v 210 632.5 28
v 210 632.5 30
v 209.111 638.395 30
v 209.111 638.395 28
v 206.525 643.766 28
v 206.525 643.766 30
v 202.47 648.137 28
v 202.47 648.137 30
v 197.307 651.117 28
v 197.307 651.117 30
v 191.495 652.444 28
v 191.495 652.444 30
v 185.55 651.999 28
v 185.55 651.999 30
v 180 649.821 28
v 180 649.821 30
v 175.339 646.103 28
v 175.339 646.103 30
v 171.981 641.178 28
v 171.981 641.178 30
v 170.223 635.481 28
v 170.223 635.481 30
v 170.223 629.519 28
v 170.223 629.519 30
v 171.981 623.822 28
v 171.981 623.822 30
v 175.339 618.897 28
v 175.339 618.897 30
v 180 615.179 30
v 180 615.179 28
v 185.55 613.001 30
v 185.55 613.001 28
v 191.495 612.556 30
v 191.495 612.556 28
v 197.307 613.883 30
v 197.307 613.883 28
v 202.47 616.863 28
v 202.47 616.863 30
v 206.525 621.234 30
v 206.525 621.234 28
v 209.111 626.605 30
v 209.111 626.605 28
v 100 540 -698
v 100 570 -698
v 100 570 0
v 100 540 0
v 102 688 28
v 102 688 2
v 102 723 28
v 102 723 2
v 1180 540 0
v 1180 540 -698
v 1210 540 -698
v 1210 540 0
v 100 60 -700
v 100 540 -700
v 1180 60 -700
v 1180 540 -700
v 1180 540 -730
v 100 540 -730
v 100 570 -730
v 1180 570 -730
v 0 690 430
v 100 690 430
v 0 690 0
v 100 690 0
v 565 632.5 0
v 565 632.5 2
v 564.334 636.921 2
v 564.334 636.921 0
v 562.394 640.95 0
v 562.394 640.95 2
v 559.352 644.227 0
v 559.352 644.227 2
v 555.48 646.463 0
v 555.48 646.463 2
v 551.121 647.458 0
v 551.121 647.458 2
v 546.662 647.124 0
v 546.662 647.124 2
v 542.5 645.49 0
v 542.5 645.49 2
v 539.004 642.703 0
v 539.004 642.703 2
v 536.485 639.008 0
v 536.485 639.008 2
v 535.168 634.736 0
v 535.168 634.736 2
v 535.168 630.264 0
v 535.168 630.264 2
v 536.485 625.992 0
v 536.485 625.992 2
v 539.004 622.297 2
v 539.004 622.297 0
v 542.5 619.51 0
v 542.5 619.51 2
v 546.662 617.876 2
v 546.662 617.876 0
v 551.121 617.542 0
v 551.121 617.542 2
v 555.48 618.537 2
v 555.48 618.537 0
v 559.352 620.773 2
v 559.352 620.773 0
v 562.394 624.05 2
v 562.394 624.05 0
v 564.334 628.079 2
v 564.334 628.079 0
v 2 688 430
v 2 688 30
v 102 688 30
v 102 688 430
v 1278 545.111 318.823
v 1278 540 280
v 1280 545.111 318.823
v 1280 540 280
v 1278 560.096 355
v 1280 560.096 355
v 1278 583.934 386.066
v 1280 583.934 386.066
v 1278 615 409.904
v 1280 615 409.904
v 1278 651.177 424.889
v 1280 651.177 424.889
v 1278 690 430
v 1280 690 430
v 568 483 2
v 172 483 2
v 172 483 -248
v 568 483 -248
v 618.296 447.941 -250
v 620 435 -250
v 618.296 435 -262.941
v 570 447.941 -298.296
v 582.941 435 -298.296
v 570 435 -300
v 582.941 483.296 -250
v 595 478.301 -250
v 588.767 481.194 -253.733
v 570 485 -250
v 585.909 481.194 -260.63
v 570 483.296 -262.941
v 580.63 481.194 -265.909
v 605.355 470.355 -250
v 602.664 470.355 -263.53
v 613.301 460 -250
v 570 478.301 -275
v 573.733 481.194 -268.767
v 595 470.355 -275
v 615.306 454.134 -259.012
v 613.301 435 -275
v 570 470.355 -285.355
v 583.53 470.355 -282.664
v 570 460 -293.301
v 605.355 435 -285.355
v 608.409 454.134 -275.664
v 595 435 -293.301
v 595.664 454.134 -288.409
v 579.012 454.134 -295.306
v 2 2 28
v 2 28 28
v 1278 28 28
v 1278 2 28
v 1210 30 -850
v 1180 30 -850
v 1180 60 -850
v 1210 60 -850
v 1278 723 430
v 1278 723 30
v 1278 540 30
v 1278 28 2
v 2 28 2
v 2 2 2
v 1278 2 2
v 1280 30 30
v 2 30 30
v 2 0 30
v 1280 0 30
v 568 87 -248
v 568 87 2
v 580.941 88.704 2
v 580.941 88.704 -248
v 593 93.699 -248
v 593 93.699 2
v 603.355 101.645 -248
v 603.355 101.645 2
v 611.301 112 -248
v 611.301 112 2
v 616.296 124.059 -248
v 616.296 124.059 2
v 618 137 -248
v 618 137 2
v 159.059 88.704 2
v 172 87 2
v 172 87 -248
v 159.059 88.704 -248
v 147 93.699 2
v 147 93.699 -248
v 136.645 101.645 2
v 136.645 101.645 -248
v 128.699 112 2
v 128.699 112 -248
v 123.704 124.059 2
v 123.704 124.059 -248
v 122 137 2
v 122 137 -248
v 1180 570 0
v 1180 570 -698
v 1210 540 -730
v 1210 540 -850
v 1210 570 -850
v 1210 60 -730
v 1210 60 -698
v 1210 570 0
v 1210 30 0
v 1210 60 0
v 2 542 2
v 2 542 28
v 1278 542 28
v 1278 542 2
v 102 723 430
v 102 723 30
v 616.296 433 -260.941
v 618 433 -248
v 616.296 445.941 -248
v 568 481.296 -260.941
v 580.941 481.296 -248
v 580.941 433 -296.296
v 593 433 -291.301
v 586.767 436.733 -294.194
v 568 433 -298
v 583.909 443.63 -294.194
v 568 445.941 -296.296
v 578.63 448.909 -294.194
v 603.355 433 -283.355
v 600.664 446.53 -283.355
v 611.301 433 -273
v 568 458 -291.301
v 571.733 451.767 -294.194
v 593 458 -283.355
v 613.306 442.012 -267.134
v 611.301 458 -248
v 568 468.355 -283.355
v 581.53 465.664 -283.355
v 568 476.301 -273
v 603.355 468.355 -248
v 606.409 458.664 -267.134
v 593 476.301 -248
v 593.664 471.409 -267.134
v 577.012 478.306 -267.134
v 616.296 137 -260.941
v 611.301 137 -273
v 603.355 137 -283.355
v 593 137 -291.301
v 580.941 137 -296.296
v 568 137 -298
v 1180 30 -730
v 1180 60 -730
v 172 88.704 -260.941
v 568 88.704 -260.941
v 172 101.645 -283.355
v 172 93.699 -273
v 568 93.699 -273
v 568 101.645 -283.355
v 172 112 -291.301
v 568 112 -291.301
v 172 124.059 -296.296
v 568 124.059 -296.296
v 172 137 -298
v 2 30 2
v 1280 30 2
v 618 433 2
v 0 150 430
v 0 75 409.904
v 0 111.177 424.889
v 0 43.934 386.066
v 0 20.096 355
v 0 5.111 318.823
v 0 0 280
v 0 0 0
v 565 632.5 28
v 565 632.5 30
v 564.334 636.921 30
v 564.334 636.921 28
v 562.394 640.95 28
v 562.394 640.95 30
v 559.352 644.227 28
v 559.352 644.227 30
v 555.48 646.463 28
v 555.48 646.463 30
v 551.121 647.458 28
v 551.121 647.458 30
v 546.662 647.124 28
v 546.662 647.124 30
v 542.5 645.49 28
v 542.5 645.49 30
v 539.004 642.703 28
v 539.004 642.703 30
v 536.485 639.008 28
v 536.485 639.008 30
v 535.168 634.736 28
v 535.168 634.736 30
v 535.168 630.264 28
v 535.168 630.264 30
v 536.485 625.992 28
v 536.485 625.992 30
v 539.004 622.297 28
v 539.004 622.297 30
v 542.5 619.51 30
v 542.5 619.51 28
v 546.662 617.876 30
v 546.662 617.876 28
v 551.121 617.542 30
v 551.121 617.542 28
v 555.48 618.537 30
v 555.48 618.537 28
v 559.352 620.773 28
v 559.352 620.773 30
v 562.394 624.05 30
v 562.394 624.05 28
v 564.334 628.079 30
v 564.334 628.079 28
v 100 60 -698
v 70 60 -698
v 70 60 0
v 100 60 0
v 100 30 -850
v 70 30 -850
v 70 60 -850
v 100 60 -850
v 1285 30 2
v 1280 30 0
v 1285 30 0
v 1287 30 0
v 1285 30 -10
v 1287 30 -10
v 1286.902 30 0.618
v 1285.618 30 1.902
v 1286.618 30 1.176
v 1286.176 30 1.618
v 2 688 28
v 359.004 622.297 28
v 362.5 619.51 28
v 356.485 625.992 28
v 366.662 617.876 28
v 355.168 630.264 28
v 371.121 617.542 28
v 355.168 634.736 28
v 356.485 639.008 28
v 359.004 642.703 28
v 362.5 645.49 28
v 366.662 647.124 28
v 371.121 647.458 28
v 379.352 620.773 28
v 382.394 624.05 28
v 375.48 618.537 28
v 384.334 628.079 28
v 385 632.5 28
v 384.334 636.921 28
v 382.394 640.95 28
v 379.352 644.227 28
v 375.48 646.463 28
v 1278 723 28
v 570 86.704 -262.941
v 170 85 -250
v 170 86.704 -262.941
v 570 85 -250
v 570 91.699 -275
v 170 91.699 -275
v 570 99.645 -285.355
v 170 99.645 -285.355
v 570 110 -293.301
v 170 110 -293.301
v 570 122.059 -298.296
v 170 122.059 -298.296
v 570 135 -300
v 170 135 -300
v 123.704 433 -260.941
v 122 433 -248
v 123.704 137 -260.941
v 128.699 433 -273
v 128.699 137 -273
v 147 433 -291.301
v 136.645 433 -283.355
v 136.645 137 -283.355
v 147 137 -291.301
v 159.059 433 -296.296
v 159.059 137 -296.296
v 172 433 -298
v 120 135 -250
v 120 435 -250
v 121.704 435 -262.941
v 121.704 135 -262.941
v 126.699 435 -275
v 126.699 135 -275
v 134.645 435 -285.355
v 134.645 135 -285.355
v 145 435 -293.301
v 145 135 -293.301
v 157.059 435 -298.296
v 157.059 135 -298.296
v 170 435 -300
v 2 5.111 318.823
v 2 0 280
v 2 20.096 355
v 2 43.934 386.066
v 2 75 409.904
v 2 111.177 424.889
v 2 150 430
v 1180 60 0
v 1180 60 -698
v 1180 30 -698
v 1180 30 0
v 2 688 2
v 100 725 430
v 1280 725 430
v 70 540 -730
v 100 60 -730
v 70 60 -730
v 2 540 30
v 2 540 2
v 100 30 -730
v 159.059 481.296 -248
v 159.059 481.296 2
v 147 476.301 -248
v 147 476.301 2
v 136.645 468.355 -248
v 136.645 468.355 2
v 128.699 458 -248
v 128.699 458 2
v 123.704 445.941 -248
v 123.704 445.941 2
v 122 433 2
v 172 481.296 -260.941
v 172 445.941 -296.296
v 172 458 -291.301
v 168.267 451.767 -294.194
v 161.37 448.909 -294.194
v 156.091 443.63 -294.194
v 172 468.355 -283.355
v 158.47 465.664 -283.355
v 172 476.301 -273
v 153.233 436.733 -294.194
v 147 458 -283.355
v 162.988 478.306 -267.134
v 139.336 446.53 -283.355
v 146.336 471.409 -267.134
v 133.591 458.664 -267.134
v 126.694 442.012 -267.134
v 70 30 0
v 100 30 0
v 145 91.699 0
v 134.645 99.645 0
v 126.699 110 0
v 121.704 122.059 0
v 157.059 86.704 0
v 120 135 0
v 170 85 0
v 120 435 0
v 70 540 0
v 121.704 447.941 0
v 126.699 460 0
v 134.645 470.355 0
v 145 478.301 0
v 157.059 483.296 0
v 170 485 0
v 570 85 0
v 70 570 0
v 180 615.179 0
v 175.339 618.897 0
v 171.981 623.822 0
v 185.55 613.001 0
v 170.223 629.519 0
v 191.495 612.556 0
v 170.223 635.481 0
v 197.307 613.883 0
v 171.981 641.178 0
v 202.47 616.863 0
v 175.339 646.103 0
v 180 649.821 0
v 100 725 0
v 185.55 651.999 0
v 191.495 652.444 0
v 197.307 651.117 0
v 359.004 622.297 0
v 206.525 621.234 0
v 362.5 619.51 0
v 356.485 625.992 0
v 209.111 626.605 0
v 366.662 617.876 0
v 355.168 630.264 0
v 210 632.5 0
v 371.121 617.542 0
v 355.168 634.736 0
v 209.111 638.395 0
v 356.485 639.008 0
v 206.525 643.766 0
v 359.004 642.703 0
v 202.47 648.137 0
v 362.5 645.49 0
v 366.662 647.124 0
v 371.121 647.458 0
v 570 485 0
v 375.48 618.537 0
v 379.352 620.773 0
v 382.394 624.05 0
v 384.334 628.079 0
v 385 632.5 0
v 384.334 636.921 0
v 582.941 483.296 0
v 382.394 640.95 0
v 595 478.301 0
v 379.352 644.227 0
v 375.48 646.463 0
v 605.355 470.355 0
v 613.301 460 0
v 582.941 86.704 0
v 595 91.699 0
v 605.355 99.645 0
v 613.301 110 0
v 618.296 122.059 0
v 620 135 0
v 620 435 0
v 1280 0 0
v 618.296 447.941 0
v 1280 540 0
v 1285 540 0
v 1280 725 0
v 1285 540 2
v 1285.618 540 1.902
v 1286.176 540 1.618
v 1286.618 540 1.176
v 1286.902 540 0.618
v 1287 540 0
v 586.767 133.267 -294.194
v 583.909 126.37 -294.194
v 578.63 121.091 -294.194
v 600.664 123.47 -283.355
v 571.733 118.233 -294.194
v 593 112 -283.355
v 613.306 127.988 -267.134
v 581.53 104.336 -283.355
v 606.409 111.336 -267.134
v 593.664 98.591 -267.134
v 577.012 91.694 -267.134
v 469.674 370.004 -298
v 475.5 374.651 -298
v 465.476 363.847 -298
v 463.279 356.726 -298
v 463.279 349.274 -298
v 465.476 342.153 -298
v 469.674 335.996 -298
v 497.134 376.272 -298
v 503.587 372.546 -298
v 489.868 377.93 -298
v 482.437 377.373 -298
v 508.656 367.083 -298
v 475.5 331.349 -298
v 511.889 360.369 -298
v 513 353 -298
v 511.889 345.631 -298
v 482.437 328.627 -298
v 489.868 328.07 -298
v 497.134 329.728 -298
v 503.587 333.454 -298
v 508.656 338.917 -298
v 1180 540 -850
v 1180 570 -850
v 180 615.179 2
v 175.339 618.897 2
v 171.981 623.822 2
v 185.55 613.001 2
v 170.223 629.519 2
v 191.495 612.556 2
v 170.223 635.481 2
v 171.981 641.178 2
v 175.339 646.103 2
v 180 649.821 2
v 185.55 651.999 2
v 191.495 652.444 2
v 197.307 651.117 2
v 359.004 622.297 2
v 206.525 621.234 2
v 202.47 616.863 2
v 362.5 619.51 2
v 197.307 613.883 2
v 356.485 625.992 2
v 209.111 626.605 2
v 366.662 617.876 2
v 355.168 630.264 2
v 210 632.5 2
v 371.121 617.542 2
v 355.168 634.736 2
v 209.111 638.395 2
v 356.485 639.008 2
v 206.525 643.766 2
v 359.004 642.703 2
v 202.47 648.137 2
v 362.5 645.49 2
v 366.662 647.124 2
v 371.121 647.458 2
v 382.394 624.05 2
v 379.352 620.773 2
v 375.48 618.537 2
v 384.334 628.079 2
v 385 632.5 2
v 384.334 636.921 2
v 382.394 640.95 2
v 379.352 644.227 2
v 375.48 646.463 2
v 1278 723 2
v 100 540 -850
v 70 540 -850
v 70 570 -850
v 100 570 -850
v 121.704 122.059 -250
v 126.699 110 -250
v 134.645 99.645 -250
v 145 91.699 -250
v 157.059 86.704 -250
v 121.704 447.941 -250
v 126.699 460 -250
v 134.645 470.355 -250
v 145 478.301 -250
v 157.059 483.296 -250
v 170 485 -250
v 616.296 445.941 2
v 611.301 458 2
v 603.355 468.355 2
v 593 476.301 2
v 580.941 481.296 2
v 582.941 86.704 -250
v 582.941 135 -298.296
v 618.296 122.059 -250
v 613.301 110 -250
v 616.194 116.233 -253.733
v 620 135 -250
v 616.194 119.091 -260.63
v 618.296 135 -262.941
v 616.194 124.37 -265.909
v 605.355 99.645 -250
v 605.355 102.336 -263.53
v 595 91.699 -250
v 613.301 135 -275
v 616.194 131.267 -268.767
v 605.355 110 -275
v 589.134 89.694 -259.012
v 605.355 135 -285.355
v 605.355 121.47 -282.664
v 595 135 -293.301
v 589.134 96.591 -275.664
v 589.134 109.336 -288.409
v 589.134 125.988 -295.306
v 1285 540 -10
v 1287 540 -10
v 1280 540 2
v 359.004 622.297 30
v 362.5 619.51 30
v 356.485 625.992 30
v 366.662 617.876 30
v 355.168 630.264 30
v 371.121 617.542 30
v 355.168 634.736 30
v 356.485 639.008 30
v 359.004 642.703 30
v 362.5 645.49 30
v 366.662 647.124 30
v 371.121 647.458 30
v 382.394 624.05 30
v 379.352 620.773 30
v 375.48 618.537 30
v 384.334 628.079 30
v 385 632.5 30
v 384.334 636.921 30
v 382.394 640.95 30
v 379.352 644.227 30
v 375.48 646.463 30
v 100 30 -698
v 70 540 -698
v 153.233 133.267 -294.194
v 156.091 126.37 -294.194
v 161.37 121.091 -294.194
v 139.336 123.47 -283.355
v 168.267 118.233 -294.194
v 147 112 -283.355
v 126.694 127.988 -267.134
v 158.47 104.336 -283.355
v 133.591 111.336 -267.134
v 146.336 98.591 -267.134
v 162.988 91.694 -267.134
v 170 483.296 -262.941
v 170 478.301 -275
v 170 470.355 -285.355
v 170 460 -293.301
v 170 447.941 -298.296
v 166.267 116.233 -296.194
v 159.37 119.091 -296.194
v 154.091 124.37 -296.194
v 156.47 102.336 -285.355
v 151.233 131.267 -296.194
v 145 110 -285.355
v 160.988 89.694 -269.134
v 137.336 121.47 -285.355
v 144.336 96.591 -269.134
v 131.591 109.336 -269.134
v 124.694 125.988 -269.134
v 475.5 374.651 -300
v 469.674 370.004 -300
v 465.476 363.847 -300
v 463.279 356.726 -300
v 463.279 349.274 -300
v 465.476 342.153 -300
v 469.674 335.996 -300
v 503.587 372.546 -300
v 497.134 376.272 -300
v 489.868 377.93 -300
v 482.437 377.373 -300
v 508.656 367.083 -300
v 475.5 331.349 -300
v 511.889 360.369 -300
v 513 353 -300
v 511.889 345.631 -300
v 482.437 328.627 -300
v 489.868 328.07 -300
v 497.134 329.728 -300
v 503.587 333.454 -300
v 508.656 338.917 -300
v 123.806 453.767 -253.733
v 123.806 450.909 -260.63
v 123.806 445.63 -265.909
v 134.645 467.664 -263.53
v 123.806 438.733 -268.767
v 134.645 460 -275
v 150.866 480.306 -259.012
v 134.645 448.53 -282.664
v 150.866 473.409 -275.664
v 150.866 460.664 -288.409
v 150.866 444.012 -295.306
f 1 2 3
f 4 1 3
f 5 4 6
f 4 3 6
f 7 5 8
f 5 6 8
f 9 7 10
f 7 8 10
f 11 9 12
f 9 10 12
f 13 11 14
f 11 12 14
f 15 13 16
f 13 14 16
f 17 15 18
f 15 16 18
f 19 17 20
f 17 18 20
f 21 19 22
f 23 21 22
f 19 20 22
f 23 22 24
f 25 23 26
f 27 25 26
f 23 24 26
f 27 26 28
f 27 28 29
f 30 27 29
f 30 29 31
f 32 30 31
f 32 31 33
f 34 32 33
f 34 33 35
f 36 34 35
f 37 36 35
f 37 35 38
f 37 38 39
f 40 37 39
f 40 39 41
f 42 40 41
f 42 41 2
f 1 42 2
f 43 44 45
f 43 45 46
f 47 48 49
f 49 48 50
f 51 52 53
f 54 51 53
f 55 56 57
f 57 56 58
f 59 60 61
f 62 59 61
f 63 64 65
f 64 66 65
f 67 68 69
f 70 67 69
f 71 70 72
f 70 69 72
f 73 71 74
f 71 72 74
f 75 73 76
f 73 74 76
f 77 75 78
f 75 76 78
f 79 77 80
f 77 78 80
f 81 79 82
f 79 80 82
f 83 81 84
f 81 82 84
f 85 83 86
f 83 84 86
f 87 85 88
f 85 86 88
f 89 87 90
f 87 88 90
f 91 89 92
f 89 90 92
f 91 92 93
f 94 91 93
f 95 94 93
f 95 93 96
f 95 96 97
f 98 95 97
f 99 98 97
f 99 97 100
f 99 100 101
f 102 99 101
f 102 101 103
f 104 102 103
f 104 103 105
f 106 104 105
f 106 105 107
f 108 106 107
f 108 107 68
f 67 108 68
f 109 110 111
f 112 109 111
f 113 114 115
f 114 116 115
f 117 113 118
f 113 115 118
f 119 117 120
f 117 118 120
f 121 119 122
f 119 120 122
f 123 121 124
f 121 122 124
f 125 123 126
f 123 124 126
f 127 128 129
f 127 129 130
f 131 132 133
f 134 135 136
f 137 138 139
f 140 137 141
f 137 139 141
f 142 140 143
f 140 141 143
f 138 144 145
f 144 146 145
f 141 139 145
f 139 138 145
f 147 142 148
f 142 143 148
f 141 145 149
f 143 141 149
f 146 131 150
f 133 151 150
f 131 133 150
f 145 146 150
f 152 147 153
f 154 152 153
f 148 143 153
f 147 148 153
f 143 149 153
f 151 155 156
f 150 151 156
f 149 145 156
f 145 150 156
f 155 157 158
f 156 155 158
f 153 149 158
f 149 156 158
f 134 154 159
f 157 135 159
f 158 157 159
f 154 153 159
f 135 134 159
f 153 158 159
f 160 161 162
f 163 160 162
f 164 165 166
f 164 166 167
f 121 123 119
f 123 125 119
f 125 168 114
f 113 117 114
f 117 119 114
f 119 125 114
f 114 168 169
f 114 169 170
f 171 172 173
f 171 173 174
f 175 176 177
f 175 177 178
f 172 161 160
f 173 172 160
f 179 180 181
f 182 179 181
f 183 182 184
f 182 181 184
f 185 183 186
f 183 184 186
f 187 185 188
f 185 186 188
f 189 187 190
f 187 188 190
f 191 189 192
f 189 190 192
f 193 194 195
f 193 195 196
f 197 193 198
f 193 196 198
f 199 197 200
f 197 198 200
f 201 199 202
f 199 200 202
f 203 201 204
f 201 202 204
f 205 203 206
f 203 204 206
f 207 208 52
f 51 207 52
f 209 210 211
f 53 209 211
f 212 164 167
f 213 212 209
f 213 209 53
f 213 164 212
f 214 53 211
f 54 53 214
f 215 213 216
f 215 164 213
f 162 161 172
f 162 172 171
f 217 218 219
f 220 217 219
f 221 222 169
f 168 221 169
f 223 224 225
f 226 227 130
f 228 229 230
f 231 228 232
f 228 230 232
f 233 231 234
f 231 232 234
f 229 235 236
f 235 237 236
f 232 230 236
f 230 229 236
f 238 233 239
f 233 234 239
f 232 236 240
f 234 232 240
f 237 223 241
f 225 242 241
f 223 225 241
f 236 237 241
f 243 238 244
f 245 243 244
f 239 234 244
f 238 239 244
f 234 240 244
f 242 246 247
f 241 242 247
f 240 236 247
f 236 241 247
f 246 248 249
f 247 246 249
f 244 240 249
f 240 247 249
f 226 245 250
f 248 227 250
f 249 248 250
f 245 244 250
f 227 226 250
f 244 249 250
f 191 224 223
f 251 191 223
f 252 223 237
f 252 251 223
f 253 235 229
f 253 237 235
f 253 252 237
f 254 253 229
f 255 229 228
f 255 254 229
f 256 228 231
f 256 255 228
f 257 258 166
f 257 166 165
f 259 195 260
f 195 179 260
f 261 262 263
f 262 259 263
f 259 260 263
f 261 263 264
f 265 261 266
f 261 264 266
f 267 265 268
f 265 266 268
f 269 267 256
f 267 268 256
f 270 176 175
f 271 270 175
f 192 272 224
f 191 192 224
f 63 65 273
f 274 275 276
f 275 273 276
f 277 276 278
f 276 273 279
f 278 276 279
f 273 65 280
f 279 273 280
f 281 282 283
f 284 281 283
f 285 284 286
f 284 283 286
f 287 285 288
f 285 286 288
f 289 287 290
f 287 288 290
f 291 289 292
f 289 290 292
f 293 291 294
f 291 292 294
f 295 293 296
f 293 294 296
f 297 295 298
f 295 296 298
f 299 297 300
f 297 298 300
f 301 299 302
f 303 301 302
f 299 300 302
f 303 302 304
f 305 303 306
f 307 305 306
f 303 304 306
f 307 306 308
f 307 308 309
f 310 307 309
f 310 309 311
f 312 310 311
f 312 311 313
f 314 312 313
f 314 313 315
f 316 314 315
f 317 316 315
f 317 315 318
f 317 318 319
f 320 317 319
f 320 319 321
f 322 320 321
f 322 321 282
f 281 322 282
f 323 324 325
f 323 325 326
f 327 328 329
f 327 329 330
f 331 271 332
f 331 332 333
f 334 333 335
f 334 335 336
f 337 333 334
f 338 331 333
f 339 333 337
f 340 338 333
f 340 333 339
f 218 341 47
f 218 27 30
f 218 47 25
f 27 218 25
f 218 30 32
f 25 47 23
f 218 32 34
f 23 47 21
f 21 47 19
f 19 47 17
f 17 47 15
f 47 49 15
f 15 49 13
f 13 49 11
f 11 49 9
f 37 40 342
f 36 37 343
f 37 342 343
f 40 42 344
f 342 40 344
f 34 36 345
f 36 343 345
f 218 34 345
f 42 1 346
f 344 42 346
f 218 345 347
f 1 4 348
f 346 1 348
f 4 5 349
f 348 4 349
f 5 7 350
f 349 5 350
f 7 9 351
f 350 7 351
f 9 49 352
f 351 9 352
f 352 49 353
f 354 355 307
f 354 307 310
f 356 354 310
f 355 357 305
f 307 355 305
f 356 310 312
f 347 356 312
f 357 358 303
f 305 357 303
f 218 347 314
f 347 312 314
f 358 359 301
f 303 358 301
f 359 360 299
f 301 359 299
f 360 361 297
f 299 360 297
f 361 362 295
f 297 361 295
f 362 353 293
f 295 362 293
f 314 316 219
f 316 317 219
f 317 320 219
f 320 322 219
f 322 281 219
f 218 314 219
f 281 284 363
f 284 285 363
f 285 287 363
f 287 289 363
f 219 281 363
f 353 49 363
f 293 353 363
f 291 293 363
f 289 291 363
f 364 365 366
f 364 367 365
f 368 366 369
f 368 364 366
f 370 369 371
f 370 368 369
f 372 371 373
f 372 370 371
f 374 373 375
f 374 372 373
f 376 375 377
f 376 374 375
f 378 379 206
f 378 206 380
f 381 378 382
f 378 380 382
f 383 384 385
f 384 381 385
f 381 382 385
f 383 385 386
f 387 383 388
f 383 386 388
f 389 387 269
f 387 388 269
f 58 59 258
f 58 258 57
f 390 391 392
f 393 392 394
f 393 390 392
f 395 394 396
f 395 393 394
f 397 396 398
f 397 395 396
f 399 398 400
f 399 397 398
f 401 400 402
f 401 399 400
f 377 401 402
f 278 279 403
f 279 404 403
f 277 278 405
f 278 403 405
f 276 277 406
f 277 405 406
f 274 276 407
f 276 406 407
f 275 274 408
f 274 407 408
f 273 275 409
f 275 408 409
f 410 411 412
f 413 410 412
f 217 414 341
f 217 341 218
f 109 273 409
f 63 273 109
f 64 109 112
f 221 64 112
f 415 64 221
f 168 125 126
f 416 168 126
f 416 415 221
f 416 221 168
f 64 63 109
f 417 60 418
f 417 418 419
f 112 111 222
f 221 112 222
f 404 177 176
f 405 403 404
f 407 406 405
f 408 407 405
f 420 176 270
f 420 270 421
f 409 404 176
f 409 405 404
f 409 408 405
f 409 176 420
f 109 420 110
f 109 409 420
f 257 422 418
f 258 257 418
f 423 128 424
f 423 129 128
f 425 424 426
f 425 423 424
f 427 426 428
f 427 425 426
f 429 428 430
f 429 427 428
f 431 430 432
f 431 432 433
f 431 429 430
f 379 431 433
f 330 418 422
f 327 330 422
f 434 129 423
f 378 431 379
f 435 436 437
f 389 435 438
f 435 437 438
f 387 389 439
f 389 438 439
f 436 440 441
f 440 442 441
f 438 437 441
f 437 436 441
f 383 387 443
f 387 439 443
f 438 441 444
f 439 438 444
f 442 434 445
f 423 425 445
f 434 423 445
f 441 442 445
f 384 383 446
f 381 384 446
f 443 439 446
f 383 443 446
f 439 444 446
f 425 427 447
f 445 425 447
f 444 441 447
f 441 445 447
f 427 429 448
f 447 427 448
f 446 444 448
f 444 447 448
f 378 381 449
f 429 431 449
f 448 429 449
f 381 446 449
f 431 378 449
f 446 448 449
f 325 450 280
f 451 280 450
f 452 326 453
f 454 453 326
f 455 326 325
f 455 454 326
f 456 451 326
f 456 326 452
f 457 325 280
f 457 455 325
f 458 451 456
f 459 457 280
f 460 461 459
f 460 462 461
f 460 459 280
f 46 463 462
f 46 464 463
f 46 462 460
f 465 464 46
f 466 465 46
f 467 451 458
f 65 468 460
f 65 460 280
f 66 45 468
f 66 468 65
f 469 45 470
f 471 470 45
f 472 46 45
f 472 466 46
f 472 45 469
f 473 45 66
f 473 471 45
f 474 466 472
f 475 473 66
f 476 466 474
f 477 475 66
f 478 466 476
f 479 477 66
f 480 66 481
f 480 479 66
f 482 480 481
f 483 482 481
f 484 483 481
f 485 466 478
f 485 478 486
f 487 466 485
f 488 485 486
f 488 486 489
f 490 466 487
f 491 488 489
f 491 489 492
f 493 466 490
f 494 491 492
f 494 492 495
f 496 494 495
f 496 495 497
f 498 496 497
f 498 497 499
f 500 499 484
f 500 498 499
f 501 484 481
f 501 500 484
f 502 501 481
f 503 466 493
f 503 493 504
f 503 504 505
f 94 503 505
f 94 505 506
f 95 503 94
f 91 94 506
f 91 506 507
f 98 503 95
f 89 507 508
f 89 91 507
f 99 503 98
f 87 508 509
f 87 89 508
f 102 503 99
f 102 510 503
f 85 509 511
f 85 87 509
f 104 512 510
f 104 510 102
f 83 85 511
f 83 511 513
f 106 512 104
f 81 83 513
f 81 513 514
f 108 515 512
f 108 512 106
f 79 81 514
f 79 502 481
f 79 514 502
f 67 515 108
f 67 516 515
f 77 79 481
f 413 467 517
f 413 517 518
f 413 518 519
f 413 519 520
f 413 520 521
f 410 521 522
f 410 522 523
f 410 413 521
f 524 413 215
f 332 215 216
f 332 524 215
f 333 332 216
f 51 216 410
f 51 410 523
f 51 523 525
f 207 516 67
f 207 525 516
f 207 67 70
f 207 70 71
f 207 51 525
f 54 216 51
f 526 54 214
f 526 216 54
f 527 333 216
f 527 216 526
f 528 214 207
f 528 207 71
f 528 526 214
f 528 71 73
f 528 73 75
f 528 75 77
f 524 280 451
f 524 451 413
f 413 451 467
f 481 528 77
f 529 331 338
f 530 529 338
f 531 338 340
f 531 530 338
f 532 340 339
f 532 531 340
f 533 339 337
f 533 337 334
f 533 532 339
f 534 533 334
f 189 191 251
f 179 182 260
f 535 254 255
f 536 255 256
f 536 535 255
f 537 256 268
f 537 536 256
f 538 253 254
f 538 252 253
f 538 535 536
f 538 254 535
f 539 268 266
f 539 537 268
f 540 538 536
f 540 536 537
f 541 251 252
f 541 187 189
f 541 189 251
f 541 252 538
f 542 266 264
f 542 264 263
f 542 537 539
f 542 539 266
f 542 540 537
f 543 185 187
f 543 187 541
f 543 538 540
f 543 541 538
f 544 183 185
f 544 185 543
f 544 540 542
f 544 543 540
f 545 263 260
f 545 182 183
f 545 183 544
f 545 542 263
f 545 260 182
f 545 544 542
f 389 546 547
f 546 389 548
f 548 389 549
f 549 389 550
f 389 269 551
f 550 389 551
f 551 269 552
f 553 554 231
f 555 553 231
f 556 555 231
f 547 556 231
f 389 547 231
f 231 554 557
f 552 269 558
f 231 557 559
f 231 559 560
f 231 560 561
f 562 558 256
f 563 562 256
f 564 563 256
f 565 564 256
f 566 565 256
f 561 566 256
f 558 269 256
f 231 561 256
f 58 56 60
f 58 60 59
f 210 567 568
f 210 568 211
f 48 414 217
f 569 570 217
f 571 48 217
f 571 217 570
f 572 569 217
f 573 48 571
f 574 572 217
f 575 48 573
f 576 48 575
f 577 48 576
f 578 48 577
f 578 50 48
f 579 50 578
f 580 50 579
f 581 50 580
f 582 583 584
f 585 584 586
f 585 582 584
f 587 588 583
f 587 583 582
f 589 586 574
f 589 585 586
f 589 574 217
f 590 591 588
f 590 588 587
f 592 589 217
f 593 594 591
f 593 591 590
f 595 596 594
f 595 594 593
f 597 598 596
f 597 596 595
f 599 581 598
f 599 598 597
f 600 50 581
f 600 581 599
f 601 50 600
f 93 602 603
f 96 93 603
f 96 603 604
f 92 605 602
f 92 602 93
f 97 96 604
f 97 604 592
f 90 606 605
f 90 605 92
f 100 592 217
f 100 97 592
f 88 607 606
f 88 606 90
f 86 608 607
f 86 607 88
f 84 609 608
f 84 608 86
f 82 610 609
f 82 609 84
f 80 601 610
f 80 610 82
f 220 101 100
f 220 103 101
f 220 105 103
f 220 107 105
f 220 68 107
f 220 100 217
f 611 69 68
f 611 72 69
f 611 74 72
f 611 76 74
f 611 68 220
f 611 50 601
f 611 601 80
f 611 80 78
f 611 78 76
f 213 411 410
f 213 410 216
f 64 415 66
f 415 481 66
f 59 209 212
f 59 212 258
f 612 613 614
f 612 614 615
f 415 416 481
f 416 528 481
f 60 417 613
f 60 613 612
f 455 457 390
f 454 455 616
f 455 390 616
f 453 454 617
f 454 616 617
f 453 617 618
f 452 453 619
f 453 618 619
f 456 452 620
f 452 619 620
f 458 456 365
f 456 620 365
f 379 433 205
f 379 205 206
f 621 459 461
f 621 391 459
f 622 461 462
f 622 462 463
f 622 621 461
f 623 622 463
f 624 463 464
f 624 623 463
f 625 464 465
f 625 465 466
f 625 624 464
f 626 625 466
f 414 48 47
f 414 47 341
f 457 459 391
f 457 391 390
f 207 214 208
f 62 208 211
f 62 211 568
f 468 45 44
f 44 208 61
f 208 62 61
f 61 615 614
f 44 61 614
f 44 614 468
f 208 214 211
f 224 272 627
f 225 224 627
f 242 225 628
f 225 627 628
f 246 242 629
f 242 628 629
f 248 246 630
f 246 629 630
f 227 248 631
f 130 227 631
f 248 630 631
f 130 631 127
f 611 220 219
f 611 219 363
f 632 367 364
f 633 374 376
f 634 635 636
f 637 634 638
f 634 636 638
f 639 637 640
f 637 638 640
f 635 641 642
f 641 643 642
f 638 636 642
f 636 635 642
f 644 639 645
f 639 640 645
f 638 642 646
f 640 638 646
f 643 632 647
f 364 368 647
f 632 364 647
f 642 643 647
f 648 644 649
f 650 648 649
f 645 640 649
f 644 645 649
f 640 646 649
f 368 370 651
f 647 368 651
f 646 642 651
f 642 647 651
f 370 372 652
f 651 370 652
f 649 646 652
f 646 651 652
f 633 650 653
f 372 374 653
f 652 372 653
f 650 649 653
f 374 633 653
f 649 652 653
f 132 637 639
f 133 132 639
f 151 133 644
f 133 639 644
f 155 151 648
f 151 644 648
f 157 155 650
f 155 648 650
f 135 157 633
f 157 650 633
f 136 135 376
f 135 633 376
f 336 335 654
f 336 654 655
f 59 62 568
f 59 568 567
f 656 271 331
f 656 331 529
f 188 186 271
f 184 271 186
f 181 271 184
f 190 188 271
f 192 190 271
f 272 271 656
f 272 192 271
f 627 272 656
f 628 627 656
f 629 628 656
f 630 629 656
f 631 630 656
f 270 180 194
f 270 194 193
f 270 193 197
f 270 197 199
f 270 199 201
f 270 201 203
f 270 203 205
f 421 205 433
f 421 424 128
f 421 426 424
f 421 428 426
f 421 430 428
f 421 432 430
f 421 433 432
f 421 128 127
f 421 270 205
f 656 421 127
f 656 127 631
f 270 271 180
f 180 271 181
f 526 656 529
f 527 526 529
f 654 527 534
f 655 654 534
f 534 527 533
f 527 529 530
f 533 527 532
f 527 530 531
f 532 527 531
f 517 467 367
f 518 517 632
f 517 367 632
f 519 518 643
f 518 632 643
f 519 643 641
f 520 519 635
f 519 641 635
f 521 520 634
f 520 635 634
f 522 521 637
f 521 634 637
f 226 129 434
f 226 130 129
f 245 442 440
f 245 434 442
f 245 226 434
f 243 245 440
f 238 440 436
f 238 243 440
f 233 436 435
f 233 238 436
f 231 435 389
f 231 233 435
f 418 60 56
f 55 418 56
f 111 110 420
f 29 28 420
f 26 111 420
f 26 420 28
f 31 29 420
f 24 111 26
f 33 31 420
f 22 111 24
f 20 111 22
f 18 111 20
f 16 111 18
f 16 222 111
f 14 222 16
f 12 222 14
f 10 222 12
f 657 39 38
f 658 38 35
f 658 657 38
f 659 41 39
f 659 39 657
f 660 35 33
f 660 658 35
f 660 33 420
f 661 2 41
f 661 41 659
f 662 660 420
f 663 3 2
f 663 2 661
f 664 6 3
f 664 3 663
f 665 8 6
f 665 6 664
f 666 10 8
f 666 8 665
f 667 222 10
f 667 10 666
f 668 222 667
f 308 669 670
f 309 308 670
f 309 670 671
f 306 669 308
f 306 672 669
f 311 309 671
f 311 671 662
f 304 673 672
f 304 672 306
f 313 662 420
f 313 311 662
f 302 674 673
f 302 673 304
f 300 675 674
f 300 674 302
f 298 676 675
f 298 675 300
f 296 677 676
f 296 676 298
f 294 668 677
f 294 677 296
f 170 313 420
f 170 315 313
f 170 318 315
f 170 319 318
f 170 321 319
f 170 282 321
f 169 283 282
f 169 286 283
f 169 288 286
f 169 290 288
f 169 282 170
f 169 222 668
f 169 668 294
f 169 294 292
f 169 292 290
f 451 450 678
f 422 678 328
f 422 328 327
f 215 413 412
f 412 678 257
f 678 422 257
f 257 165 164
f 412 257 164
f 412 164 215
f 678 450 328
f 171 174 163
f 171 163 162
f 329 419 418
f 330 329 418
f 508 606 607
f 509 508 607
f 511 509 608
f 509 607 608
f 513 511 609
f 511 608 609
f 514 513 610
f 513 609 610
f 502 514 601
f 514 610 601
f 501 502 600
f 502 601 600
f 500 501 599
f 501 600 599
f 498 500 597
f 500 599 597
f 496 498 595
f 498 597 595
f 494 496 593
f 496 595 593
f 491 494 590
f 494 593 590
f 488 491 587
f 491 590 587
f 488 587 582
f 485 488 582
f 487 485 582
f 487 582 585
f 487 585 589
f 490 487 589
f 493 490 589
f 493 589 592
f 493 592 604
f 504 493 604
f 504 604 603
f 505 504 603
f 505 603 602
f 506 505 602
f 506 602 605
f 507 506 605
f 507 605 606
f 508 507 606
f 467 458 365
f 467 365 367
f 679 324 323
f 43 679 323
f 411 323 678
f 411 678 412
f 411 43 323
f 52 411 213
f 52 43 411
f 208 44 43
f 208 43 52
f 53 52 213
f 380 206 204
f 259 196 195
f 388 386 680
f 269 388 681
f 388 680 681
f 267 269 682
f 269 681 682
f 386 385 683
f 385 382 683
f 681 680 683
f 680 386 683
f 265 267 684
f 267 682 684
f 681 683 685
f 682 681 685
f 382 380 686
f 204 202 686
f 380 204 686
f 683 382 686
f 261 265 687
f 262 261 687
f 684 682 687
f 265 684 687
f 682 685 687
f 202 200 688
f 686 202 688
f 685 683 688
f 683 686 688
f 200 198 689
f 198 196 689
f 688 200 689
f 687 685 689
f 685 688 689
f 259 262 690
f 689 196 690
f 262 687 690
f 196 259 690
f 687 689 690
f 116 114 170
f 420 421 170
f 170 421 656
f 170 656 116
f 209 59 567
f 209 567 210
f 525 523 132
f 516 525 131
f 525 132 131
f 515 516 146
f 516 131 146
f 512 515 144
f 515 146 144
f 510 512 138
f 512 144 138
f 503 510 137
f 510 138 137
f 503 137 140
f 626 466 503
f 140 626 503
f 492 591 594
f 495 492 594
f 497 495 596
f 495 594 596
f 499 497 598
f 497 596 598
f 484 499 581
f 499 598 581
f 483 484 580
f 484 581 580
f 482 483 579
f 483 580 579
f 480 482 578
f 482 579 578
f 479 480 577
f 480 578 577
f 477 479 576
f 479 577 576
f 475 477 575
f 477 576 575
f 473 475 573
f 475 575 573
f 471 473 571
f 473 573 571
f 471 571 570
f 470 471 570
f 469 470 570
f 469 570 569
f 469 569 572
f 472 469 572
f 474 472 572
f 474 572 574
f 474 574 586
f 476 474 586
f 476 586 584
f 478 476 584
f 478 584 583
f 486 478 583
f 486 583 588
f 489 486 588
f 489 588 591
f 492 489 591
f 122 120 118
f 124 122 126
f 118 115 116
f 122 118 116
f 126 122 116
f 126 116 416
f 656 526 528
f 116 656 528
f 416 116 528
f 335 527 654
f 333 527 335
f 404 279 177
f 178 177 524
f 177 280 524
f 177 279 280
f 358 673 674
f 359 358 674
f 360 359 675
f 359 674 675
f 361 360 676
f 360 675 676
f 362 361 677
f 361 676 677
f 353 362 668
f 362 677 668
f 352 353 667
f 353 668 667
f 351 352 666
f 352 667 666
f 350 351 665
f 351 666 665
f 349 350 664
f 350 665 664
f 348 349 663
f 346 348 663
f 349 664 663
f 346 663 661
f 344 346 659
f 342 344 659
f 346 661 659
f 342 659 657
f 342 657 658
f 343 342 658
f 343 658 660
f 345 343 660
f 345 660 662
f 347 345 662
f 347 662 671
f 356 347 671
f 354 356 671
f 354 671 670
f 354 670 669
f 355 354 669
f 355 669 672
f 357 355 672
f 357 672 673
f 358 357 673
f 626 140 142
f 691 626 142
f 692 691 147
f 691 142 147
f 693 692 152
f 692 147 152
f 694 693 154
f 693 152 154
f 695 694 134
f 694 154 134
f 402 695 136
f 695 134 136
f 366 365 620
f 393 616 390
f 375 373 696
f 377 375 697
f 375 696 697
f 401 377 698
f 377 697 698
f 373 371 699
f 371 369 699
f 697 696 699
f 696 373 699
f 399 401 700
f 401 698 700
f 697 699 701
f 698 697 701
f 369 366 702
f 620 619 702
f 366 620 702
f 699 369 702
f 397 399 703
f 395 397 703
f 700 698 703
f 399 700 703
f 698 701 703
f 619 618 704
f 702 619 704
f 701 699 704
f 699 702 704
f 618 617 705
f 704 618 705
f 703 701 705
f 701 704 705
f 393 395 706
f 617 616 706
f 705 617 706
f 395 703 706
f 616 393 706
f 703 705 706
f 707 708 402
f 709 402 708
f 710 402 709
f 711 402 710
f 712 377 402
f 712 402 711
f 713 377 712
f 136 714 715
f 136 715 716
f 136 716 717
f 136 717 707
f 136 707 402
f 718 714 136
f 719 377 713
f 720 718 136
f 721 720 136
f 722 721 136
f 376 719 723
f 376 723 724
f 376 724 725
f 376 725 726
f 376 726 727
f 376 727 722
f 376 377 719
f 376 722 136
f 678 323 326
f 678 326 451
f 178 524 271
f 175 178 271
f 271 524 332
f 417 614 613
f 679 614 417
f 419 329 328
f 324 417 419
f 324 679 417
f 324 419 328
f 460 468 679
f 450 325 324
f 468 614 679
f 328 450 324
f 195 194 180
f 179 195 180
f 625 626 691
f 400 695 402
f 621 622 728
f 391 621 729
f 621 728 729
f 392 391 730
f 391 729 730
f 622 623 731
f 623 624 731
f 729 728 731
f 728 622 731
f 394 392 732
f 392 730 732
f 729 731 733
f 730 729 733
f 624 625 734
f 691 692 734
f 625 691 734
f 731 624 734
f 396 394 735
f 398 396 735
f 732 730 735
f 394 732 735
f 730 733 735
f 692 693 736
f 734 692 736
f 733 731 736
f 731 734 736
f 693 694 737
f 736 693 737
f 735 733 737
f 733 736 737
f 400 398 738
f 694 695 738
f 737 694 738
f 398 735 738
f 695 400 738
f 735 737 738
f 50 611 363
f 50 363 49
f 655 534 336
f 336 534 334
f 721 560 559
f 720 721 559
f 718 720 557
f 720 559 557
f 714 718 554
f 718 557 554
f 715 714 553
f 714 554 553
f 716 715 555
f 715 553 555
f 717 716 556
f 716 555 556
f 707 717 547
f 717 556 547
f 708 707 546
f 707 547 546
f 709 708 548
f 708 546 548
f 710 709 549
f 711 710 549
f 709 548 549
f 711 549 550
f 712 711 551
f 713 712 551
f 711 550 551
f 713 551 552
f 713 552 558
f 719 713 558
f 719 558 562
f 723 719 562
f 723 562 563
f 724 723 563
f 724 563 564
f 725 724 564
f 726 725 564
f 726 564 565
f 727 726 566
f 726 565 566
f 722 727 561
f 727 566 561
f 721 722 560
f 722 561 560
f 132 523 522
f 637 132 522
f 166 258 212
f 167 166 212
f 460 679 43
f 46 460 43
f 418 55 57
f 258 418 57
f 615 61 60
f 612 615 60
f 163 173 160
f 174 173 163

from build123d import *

# Parameters (mm, degrees)
F1_DEPTH    = 30
F2_W        = 1278
F2_H        = 510
F3_DEPTH    = 28
F4_W        = 500
F4_H        = 400
F5_DEPTH    = 300
F6_T        = 2
F6_T3_DEPTH = 34
F6_T5_DEPTH = 404
F6_T7_DEPTH = 504
F6_T9_DEPTH = 32
F7_R        = 50
F8_R        = 25
F9_DEPTH    = 2
F10_R       = 15
F10_R_2     = 20
F11_DEPTH   = 30
F12_W       = 510
F12_H       = 2
F13_DEPTH   = 5
F14_W       = 510
F14_H       = 2
F15_ANGLE   = 90
F16_W       = 2
F16_H       = 510
F17_DEPTH   = 10
F19_DEPTH   = 400
F20_R       = 150
F21_W       = 30
F21_H       = 30
F22_DEPTH   = 850
F23_W       = 30
F23_H       = 30
F24_DEPTH   = 1080
F25_W       = 30
F25_H       = 30
F26_DEPTH   = 480
F28_DEPTH   = 2


# Not quite as in the source:
# - a shell that OpenCascade refuses in one call is made with other operations: the cavity is built on its own and cut out


with BuildPart() as f1:
    # F0 (on Top) → F1 (new body)
    with BuildSketch(Plane.XY):
        Polygon((0, 690), (0, 0), (1280, 0), (1280, 725), (100, 725), (100, 690), align=None)
    extrude(amount=F1_DEPTH)

    # F2 (on face) → F3 (cut)
    with BuildSketch(Plane.XY.offset(30)):
        with Locations((641, 285)):
            Rectangle(F2_W, F2_H)
    extrude(amount=-F3_DEPTH, mode=Mode.SUBTRACT)

    # F4 (on face) → F5 (join)
    with BuildSketch(Plane(origin=(0, 0, 0), x_dir=(1, 0, 0), z_dir=(0, 0, -1))):
        with Locations((370, -285)):
            Rectangle(F4_W, F4_H)
    extrude(amount=F5_DEPTH)

    # F6: shell of thickness 2, made by hand


with BuildPart() as f6_core1:
    # F6_t2: copy of F1
    add(f1.part)

    # the walls: a layer under each face that stays
    f6_faces = [f6_core1.faces().sort_by_distance(p)[0] for p in [
        (0, 345, 15),
        (50, 690, 15),
        (640, 0, 15),
        (640, 362.5, 0),
        (213.3333333333, 604.1666666667, 30),
        (100, 707.5, 15),
        (1280, 604.1666666667, 25),
        (690, 725, 15),
        (620, 285, -150),
        (370, 485, -150),
        (120, 285, -150),
        (370, 85, -150),
        (641, 540, 16),
        (2, 285, 16),
        (641, 30, 16),
        (370, 285, -300),
    ]]
    thicken(f6_faces, amount=-F6_T, mode=Mode.SUBTRACT)

    # F6_s4 → F6_t3 (cut)
    with BuildSketch(Plane.XY.offset(-2)):
        Polygon((99.98, 690.02), (100, 688), (102, 688), (102, 690), align=None)
    extrude(amount=F6_T3_DEPTH, mode=Mode.SUBTRACT)

    # F6_s6 → F6_t5 (cut)
    with BuildSketch(Plane.XZ.offset(-487)):
        Polygon((620.02, -0.02), (620, 2), (618, 2), (618, 0), align=None)
        Polygon((119.98, -0.02), (120, 2), (122, 2), (122, 0), align=None)
    extrude(amount=F6_T5_DEPTH, mode=Mode.SUBTRACT)

    # F6_s8 → F6_t7 (cut)
    with BuildSketch(Plane.YZ.offset(118)):
        Polygon((485.02, -0.02), (485, 2), (483, 2), (483, 0), align=None)
        Polygon((84.98, -0.02), (85, 2), (87, 2), (87, 0), align=None)
    extrude(amount=F6_T7_DEPTH, mode=Mode.SUBTRACT)

    # F6_s10 → F6_t9 (cut)
    with BuildSketch(Plane.XY):
        Polygon((2.02, 539.98), (2, 542), (0, 542), (0, 540), align=None)
        Polygon((2.02, 30.02), (0, 30), (0, 28), (2, 28), align=None)
    extrude(amount=F6_T9_DEPTH, mode=Mode.SUBTRACT)


with BuildPart() as f1_1:
    add(f1.part)

    # what is left inside the walls is the cavity
    f6_cavity = [f6_core1.part.solids().sort_by_distance(p)[0] for p in [
        (640, 10.666667, 2.02),
        (640, 602.333333, 27.98),
        (370, 351, -297.98),
    ]]
    add(f6_cavity, mode=Mode.SUBTRACT)

    # F7
    f7_edges = [f1_1.edges().sort_by_distance(p)[0] for p in [
        (122, 483, -148),
        (618, 483, -148),
        (122, 87, -148),
        (618, 87, -148),
        (618, 285, -298),
        (370, 483, -298),
        (122, 285, -298),
        (370, 87, -298),
        (120, 85, -150),
        (370, 85, -300),
        (620, 85, -150),
        (620, 285, -300),
        (620, 485, -150),
        (370, 485, -300),
        (120, 485, -150),
        (120, 285, -300),
    ]]
    fillet(f7_edges, radius=F7_R)

    # F8 (on face) → F9 (cut, through all)
    with BuildSketch(Plane.XY.offset(-298)):
        with Locations((488, 353)):
            Circle(F8_R)
    extrude(amount=-F9_DEPTH, mode=Mode.SUBTRACT)

    # F10 (on face) → F11 (cut, through all)
    with BuildSketch(Plane.XY.offset(30)):
        with Locations((550, 632.5)):
            Circle(F10_R)
        with Locations((370, 632.5)):
            Circle(F10_R)
        with Locations((190, 632.5)):
            Circle(F10_R_2)
    extrude(amount=-F11_DEPTH, mode=Mode.SUBTRACT)

    # F12 (on face) → F13 (join)
    with BuildSketch(Plane.YZ.offset(1280)):
        with Locations((285, 1)):
            Rectangle(F12_W, F12_H)
    extrude(amount=F13_DEPTH)

    # F14 (on face) → F15 (revolve)
    with BuildSketch(Plane.YZ.offset(1285)):
        with Locations((285, 1)):
            Rectangle(F14_W, F14_H)
    revolve(axis=Axis((1285, 285, 0), (0, 1, 0)), revolution_arc=F15_ANGLE)

    # F16 (on face) → F17 (join)
    with BuildSketch(Plane(origin=(0, 0, 0), x_dir=(1, 0, 0), z_dir=(0, 0, -1))):
        with Locations((1286, -285)):
            Rectangle(F16_W, F16_H)
    extrude(amount=F17_DEPTH)

    # F18 (on face) → F19 (join)
    with BuildSketch(Plane.XY.offset(30)):
        Polygon((1278, 540), (1280, 540), (1280, 725), (100, 725), (100, 690), (0, 690), (0, 0), (2, 0), (2, 688), (102, 688), (102, 723), (1278, 723), align=None)
    extrude(amount=F19_DEPTH)

    # F20
    f20_edges = [f1_1.edges().sort_by_distance(p)[0] for p in [
        (1279, 540, 430),
        (1, 0, 430),
    ]]
    fillet(f20_edges, radius=F20_R)

    # F21 (on face) → F22 (join)
    with BuildSketch(Plane(origin=(0, 0, 0), x_dir=(1, 0, 0), z_dir=(0, 0, -1))):
        with Locations((85, -45)):
            Rectangle(F21_W, F21_H)
        with Locations((1195, -45)):
            Rectangle(F21_W, F21_H)
        with Locations((1195, -555)):
            Rectangle(F21_W, F21_H)
        with Locations((85, -555)):
            Rectangle(F21_W, F21_H)
    extrude(amount=F22_DEPTH)

    # F23 (on face) → F24 (join, through all)
    with BuildSketch(Plane.YZ.offset(100)):
        with Locations((45, -715)):
            Rectangle(F23_W, F23_H)
        with Locations((555, -715)):
            Rectangle(F23_W, F23_H)
    extrude(amount=F24_DEPTH)

    # F25 (on face) → F26 (join, through all)
    with BuildSketch(Plane(origin=(0, 60, 0), x_dir=(-1, 0, 0), z_dir=(0, 1, 0))):
        with Locations((-1195, -715)):
            Rectangle(F25_W, F25_H)
        with Locations((-85, -715)):
            Rectangle(F25_W, F25_H)
    extrude(amount=F26_DEPTH)

    # F27 (on face) → F28 (join)
    with BuildSketch(Plane.XY.offset(-700)):
        Polygon((100, 60), (100, 30), (1180, 30), (1180, 60), (1210, 60), (1210, 540), (1180, 540), (1180, 570), (100, 570), (100, 540), (70, 540), (70, 60), align=None)
    extrude(amount=F28_DEPTH)


solid = f1_1.part
